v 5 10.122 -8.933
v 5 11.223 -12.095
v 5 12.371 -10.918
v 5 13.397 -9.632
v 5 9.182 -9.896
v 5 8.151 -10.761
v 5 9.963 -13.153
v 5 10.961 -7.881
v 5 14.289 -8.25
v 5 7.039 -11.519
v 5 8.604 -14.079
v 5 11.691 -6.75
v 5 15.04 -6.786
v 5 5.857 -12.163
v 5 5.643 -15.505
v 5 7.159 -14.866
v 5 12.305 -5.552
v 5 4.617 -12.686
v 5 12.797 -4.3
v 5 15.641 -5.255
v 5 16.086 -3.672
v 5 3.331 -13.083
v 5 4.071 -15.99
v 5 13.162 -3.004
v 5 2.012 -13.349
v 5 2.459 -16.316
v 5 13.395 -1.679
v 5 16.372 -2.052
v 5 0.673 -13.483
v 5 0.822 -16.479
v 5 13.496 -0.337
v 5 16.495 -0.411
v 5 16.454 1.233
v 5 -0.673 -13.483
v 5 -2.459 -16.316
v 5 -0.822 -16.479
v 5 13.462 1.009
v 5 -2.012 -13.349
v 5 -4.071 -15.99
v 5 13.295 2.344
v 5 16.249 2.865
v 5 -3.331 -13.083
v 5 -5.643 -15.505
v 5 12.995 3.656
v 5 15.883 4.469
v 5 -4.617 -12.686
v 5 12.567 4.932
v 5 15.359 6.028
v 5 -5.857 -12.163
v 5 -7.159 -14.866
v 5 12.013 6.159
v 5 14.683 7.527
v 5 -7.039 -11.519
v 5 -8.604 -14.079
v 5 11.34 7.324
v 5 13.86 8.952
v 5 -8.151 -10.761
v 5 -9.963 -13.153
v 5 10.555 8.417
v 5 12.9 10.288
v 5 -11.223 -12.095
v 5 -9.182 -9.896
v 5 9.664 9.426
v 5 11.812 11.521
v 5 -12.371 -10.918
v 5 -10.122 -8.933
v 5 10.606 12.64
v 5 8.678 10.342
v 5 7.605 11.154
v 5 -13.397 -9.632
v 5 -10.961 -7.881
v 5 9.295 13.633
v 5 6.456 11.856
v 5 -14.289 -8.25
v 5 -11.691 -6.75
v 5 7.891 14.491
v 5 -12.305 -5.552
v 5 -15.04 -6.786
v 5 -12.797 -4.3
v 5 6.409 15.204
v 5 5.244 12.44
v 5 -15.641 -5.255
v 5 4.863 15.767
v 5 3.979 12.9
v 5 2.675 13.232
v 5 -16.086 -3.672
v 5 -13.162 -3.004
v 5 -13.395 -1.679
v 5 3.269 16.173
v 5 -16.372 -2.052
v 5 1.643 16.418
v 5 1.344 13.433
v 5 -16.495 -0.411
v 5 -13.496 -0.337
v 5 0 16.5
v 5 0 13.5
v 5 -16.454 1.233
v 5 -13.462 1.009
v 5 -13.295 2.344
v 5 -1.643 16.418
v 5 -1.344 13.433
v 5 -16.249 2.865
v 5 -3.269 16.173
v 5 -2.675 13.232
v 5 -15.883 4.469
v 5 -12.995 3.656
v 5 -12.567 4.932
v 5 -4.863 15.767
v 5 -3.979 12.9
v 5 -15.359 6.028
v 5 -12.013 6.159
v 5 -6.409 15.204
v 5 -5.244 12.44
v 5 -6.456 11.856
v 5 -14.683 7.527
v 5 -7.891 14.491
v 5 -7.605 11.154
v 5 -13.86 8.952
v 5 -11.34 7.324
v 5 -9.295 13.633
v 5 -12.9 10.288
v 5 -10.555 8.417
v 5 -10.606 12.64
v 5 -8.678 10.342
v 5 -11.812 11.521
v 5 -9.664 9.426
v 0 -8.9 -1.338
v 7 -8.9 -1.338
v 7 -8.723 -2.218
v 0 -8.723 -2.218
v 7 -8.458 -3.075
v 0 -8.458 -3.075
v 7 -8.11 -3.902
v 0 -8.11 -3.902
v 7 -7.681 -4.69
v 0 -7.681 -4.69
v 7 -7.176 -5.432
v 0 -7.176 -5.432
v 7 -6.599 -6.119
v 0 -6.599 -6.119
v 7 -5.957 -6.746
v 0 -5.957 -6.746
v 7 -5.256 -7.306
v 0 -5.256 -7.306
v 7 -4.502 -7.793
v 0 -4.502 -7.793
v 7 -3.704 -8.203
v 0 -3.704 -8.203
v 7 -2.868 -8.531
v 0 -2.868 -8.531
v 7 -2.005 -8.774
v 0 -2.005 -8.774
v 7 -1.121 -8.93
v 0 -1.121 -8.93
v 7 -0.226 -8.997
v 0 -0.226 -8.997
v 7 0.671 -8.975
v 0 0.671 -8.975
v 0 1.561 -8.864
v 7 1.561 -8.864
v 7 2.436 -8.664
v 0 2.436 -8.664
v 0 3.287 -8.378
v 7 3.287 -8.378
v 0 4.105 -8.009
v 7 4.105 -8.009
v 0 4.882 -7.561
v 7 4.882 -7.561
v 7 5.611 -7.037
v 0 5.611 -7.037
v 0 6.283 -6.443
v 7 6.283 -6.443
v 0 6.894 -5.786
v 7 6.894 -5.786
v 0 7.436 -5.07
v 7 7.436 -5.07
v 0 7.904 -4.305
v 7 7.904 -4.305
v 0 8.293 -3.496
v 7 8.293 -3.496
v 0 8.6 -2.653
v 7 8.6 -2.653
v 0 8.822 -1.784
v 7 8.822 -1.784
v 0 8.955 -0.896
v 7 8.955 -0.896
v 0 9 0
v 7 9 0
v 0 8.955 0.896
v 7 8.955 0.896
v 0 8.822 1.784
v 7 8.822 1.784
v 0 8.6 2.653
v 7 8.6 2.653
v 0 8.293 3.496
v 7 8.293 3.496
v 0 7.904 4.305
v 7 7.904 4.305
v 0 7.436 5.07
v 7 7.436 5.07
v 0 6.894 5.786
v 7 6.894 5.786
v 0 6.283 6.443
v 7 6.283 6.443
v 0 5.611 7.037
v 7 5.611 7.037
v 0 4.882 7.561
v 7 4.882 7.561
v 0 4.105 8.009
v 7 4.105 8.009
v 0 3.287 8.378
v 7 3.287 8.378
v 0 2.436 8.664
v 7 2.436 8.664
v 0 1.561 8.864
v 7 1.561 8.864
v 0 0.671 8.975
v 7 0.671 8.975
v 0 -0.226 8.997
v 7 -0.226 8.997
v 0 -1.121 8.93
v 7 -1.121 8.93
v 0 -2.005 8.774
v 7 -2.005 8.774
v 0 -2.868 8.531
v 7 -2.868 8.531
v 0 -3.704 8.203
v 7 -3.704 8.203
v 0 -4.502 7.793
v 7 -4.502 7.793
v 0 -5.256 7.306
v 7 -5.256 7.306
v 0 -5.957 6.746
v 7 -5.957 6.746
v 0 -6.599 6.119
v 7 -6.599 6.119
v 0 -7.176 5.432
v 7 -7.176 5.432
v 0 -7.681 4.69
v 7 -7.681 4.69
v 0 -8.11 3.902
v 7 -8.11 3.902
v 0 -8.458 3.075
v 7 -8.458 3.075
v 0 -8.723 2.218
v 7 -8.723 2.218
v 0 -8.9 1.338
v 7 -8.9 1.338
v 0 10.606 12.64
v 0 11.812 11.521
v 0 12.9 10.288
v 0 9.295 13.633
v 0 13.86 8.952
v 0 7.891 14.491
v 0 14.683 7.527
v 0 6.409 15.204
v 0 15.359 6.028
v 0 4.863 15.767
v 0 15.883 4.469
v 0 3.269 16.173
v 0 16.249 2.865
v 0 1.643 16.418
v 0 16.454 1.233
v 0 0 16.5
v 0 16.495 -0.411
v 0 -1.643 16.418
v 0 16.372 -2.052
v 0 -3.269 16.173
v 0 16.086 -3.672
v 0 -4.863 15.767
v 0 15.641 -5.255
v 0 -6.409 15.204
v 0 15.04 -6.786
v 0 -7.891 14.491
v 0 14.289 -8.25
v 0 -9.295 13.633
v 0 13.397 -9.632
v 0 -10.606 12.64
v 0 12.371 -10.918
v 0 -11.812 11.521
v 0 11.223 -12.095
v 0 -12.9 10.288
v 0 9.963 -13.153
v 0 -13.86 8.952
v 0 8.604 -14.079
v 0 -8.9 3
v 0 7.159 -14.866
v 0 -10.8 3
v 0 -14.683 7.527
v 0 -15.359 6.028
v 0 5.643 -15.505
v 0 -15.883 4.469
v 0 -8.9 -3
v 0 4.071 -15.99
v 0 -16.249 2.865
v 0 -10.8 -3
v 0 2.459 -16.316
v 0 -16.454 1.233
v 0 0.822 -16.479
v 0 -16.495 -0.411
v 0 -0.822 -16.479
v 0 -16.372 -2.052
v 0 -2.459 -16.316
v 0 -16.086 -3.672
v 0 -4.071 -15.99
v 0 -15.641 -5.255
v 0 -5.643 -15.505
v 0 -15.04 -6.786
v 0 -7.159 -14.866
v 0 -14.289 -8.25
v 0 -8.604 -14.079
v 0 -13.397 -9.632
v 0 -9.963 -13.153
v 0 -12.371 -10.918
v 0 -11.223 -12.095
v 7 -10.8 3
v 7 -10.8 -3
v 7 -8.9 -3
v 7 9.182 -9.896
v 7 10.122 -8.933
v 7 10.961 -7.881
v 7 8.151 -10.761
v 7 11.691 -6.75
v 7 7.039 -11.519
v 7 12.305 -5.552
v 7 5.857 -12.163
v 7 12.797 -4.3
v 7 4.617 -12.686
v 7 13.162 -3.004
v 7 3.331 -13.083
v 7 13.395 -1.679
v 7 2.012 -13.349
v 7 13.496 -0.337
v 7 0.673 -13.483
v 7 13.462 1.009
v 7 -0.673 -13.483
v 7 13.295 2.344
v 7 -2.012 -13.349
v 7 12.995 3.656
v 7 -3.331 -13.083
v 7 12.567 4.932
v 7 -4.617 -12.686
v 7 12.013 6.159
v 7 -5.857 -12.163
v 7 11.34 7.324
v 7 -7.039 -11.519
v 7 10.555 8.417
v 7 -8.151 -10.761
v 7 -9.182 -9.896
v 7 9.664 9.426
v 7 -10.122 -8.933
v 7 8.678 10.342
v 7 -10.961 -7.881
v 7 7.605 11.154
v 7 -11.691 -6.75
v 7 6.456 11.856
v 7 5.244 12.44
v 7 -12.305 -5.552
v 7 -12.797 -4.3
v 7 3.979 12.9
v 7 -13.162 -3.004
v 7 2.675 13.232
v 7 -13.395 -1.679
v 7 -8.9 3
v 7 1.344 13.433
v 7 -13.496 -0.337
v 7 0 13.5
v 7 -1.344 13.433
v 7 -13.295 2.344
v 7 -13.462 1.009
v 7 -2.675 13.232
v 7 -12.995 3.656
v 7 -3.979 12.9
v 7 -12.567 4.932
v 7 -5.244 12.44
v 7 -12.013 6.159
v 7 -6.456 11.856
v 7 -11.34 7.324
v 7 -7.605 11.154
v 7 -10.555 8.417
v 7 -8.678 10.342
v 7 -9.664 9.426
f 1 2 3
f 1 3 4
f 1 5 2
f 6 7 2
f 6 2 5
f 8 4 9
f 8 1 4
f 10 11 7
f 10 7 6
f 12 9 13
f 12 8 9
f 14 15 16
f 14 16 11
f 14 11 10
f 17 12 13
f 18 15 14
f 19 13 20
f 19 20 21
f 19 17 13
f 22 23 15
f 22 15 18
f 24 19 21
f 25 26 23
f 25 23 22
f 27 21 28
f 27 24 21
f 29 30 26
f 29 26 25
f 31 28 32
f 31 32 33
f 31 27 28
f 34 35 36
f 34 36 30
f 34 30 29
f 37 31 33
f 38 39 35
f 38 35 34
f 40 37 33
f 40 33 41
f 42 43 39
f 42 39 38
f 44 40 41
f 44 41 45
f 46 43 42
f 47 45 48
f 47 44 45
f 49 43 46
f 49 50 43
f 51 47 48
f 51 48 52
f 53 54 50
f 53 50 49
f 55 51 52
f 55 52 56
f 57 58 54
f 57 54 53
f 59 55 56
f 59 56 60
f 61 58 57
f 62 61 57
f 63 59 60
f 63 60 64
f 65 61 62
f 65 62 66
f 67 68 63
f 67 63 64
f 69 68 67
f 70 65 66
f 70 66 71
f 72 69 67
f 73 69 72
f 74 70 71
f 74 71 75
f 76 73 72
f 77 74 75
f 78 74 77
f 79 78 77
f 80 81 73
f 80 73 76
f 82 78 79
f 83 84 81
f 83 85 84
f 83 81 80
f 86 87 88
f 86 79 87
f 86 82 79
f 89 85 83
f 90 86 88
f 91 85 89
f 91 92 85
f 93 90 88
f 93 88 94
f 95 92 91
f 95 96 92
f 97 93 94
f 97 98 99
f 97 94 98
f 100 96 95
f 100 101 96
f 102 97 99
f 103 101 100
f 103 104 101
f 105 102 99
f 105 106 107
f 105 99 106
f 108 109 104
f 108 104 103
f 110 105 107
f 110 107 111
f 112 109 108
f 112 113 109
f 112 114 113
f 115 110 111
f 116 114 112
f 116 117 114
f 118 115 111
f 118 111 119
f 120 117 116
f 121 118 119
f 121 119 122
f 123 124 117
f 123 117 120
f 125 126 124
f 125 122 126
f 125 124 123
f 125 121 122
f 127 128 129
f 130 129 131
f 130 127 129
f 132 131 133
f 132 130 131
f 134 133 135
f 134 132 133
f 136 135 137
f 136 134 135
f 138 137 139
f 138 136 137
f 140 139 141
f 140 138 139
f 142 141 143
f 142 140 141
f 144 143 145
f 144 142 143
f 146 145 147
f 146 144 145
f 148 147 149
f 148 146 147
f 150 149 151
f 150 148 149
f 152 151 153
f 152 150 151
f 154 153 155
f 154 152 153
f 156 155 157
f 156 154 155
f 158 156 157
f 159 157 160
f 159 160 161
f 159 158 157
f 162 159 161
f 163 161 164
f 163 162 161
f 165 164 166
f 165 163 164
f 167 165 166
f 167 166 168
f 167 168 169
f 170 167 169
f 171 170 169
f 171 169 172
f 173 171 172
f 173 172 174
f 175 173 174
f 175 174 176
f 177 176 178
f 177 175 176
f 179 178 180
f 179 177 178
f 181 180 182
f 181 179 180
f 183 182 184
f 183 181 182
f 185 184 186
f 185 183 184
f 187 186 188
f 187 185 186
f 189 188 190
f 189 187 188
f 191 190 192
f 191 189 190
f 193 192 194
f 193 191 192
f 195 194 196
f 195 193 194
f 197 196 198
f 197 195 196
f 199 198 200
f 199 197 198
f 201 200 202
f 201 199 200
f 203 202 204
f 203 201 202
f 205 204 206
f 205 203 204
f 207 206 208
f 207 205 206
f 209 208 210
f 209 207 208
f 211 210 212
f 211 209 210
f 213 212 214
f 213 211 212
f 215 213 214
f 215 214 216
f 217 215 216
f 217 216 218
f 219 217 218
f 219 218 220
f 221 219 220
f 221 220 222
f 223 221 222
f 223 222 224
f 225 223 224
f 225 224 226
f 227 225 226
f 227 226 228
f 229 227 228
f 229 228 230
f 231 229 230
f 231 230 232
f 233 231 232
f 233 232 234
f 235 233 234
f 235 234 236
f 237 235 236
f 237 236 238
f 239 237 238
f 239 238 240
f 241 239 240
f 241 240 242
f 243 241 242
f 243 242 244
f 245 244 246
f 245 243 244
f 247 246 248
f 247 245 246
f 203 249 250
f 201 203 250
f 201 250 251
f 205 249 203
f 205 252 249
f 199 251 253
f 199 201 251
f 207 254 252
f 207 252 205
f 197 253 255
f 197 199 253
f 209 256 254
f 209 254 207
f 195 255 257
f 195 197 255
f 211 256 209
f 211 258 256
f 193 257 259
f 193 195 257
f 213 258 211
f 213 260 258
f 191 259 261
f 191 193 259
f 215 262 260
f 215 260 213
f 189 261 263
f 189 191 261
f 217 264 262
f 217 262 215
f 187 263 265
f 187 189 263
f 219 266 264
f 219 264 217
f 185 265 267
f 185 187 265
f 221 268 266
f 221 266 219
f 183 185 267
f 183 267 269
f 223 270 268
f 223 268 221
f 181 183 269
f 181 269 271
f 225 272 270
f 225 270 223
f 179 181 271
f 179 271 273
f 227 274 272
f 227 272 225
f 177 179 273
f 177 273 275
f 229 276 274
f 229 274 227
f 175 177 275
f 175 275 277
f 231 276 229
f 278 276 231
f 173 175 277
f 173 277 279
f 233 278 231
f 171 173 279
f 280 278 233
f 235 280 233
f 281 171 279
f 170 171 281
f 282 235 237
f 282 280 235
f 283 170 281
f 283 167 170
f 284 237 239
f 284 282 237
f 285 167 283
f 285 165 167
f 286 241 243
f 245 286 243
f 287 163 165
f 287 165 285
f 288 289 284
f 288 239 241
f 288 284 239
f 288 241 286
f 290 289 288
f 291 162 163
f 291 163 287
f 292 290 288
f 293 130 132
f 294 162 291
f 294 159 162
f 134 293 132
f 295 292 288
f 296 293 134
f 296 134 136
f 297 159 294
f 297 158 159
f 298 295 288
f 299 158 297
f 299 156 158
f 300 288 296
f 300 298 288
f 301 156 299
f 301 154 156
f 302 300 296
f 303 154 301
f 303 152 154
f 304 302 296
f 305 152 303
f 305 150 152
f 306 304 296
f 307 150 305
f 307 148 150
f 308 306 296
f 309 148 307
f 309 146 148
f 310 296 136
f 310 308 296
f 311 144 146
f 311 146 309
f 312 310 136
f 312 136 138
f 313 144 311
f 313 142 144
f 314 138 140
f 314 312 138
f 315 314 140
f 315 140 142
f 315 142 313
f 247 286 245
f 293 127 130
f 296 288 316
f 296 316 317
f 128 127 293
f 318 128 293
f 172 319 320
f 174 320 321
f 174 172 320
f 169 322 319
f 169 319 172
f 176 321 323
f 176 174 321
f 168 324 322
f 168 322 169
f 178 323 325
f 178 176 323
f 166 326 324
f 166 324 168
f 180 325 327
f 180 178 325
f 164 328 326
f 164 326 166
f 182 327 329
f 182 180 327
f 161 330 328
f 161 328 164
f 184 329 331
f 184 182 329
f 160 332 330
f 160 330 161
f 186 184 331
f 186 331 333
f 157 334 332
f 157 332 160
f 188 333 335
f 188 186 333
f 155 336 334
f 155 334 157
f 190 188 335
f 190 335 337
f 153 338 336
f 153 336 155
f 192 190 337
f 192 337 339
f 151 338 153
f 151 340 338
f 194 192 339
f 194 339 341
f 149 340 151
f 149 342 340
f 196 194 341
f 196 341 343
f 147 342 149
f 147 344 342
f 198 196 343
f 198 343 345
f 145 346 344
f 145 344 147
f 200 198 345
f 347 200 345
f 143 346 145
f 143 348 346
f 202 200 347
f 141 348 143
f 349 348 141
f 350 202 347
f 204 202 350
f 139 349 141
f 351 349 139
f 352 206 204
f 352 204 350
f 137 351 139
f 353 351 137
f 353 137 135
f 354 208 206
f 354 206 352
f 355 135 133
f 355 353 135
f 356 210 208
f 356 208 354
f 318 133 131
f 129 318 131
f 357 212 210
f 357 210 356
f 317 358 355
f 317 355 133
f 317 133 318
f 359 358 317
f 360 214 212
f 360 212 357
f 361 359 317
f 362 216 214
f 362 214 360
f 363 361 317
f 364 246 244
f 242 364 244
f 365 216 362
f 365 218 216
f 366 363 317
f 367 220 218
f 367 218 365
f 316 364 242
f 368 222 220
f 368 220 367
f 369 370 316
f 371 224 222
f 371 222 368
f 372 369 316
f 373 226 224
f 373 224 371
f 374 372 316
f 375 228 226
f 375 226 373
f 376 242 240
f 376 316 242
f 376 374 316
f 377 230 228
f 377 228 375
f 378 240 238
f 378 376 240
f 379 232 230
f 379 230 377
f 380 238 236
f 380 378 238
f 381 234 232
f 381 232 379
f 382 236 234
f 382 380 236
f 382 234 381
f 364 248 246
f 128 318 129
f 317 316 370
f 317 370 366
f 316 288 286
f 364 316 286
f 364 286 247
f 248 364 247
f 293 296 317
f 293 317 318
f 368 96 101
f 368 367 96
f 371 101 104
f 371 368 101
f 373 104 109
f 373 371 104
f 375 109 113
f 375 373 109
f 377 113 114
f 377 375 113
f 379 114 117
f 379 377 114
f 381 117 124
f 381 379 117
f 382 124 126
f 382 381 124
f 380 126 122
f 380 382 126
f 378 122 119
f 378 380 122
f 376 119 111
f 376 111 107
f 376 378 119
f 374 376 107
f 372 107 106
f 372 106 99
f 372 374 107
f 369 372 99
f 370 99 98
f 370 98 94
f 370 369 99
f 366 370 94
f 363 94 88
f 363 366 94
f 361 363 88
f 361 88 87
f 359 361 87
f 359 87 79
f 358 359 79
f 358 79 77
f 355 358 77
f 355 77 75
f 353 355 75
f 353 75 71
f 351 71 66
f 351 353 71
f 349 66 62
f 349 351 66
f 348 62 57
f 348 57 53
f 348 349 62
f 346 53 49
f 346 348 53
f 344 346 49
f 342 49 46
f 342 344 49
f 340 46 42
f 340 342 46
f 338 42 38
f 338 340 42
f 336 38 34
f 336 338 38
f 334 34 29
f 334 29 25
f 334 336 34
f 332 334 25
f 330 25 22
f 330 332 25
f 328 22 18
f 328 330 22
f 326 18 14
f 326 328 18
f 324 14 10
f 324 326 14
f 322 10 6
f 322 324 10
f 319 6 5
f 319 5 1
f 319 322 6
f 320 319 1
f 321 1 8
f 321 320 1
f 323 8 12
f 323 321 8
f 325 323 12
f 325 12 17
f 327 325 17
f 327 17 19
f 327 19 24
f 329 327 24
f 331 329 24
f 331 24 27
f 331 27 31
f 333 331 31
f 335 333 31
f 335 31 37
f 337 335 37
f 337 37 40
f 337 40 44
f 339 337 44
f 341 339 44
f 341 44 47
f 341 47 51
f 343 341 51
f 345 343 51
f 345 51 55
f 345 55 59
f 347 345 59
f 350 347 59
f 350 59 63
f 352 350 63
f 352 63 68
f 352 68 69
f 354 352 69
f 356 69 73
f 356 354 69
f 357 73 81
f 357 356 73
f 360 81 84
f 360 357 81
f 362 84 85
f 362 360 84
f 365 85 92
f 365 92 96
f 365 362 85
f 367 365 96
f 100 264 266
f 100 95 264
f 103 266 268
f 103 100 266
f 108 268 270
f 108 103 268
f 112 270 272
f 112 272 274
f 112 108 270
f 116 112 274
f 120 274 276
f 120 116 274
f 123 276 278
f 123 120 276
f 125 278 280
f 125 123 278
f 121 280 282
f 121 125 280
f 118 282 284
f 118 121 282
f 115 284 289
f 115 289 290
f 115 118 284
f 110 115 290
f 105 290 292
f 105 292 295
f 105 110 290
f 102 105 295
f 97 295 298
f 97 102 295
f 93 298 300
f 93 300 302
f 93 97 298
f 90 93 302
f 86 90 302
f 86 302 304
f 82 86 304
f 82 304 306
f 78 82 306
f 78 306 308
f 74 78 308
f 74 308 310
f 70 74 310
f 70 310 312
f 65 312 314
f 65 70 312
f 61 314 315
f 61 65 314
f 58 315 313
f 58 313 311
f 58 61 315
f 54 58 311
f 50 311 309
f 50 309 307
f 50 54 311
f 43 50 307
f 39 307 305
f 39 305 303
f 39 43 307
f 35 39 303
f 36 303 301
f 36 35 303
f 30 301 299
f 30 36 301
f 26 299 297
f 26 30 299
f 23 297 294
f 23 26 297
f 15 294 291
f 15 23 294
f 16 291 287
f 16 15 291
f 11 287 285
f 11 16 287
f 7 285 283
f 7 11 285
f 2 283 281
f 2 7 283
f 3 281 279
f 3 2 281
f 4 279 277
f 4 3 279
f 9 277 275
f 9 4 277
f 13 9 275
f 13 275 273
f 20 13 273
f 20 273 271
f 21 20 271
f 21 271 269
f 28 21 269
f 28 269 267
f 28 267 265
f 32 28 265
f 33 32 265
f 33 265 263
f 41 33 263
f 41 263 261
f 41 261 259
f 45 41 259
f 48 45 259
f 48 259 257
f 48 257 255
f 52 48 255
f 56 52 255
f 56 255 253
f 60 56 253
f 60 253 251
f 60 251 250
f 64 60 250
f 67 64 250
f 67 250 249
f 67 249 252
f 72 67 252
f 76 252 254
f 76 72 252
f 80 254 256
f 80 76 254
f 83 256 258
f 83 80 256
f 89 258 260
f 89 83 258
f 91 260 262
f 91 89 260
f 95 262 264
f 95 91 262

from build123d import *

# Parameters (mm, degrees)
SKETCH_2_W        = 6
SKETCH_2_H        = 1.9
F_02_KEYWAY_DEPTH = 25.36185543


with BuildPart() as part:
    # 草图1 → 旋转1 (revolve)
    with BuildSketch(Plane.XY, mode=Mode.PRIVATE) as revolve_1_sk:
        Polygon((0, 9), (0, 16.5), (5, 16.5), (5, 13.5), (7, 13.5), (7, 9), align=None)
    revolve(revolve_1_sk.sketch.rotate(Axis((-3, 0, 0), (1, 0, 0)), 90), axis=Axis((-3, 0, 0), (1, 0, 0)))

    # 草图2 → 02_KEYWAY (cut, through all)
    with BuildSketch(Plane(origin=(0, 0, 0), x_dir=(0, 0, -1), z_dir=(1, 0, 0))):
        with Locations((0, -9.85)):
            Rectangle(SKETCH_2_W, SKETCH_2_H)
    extrude(amount=F_02_KEYWAY_DEPTH, mode=Mode.SUBTRACT)


solid = part.part
